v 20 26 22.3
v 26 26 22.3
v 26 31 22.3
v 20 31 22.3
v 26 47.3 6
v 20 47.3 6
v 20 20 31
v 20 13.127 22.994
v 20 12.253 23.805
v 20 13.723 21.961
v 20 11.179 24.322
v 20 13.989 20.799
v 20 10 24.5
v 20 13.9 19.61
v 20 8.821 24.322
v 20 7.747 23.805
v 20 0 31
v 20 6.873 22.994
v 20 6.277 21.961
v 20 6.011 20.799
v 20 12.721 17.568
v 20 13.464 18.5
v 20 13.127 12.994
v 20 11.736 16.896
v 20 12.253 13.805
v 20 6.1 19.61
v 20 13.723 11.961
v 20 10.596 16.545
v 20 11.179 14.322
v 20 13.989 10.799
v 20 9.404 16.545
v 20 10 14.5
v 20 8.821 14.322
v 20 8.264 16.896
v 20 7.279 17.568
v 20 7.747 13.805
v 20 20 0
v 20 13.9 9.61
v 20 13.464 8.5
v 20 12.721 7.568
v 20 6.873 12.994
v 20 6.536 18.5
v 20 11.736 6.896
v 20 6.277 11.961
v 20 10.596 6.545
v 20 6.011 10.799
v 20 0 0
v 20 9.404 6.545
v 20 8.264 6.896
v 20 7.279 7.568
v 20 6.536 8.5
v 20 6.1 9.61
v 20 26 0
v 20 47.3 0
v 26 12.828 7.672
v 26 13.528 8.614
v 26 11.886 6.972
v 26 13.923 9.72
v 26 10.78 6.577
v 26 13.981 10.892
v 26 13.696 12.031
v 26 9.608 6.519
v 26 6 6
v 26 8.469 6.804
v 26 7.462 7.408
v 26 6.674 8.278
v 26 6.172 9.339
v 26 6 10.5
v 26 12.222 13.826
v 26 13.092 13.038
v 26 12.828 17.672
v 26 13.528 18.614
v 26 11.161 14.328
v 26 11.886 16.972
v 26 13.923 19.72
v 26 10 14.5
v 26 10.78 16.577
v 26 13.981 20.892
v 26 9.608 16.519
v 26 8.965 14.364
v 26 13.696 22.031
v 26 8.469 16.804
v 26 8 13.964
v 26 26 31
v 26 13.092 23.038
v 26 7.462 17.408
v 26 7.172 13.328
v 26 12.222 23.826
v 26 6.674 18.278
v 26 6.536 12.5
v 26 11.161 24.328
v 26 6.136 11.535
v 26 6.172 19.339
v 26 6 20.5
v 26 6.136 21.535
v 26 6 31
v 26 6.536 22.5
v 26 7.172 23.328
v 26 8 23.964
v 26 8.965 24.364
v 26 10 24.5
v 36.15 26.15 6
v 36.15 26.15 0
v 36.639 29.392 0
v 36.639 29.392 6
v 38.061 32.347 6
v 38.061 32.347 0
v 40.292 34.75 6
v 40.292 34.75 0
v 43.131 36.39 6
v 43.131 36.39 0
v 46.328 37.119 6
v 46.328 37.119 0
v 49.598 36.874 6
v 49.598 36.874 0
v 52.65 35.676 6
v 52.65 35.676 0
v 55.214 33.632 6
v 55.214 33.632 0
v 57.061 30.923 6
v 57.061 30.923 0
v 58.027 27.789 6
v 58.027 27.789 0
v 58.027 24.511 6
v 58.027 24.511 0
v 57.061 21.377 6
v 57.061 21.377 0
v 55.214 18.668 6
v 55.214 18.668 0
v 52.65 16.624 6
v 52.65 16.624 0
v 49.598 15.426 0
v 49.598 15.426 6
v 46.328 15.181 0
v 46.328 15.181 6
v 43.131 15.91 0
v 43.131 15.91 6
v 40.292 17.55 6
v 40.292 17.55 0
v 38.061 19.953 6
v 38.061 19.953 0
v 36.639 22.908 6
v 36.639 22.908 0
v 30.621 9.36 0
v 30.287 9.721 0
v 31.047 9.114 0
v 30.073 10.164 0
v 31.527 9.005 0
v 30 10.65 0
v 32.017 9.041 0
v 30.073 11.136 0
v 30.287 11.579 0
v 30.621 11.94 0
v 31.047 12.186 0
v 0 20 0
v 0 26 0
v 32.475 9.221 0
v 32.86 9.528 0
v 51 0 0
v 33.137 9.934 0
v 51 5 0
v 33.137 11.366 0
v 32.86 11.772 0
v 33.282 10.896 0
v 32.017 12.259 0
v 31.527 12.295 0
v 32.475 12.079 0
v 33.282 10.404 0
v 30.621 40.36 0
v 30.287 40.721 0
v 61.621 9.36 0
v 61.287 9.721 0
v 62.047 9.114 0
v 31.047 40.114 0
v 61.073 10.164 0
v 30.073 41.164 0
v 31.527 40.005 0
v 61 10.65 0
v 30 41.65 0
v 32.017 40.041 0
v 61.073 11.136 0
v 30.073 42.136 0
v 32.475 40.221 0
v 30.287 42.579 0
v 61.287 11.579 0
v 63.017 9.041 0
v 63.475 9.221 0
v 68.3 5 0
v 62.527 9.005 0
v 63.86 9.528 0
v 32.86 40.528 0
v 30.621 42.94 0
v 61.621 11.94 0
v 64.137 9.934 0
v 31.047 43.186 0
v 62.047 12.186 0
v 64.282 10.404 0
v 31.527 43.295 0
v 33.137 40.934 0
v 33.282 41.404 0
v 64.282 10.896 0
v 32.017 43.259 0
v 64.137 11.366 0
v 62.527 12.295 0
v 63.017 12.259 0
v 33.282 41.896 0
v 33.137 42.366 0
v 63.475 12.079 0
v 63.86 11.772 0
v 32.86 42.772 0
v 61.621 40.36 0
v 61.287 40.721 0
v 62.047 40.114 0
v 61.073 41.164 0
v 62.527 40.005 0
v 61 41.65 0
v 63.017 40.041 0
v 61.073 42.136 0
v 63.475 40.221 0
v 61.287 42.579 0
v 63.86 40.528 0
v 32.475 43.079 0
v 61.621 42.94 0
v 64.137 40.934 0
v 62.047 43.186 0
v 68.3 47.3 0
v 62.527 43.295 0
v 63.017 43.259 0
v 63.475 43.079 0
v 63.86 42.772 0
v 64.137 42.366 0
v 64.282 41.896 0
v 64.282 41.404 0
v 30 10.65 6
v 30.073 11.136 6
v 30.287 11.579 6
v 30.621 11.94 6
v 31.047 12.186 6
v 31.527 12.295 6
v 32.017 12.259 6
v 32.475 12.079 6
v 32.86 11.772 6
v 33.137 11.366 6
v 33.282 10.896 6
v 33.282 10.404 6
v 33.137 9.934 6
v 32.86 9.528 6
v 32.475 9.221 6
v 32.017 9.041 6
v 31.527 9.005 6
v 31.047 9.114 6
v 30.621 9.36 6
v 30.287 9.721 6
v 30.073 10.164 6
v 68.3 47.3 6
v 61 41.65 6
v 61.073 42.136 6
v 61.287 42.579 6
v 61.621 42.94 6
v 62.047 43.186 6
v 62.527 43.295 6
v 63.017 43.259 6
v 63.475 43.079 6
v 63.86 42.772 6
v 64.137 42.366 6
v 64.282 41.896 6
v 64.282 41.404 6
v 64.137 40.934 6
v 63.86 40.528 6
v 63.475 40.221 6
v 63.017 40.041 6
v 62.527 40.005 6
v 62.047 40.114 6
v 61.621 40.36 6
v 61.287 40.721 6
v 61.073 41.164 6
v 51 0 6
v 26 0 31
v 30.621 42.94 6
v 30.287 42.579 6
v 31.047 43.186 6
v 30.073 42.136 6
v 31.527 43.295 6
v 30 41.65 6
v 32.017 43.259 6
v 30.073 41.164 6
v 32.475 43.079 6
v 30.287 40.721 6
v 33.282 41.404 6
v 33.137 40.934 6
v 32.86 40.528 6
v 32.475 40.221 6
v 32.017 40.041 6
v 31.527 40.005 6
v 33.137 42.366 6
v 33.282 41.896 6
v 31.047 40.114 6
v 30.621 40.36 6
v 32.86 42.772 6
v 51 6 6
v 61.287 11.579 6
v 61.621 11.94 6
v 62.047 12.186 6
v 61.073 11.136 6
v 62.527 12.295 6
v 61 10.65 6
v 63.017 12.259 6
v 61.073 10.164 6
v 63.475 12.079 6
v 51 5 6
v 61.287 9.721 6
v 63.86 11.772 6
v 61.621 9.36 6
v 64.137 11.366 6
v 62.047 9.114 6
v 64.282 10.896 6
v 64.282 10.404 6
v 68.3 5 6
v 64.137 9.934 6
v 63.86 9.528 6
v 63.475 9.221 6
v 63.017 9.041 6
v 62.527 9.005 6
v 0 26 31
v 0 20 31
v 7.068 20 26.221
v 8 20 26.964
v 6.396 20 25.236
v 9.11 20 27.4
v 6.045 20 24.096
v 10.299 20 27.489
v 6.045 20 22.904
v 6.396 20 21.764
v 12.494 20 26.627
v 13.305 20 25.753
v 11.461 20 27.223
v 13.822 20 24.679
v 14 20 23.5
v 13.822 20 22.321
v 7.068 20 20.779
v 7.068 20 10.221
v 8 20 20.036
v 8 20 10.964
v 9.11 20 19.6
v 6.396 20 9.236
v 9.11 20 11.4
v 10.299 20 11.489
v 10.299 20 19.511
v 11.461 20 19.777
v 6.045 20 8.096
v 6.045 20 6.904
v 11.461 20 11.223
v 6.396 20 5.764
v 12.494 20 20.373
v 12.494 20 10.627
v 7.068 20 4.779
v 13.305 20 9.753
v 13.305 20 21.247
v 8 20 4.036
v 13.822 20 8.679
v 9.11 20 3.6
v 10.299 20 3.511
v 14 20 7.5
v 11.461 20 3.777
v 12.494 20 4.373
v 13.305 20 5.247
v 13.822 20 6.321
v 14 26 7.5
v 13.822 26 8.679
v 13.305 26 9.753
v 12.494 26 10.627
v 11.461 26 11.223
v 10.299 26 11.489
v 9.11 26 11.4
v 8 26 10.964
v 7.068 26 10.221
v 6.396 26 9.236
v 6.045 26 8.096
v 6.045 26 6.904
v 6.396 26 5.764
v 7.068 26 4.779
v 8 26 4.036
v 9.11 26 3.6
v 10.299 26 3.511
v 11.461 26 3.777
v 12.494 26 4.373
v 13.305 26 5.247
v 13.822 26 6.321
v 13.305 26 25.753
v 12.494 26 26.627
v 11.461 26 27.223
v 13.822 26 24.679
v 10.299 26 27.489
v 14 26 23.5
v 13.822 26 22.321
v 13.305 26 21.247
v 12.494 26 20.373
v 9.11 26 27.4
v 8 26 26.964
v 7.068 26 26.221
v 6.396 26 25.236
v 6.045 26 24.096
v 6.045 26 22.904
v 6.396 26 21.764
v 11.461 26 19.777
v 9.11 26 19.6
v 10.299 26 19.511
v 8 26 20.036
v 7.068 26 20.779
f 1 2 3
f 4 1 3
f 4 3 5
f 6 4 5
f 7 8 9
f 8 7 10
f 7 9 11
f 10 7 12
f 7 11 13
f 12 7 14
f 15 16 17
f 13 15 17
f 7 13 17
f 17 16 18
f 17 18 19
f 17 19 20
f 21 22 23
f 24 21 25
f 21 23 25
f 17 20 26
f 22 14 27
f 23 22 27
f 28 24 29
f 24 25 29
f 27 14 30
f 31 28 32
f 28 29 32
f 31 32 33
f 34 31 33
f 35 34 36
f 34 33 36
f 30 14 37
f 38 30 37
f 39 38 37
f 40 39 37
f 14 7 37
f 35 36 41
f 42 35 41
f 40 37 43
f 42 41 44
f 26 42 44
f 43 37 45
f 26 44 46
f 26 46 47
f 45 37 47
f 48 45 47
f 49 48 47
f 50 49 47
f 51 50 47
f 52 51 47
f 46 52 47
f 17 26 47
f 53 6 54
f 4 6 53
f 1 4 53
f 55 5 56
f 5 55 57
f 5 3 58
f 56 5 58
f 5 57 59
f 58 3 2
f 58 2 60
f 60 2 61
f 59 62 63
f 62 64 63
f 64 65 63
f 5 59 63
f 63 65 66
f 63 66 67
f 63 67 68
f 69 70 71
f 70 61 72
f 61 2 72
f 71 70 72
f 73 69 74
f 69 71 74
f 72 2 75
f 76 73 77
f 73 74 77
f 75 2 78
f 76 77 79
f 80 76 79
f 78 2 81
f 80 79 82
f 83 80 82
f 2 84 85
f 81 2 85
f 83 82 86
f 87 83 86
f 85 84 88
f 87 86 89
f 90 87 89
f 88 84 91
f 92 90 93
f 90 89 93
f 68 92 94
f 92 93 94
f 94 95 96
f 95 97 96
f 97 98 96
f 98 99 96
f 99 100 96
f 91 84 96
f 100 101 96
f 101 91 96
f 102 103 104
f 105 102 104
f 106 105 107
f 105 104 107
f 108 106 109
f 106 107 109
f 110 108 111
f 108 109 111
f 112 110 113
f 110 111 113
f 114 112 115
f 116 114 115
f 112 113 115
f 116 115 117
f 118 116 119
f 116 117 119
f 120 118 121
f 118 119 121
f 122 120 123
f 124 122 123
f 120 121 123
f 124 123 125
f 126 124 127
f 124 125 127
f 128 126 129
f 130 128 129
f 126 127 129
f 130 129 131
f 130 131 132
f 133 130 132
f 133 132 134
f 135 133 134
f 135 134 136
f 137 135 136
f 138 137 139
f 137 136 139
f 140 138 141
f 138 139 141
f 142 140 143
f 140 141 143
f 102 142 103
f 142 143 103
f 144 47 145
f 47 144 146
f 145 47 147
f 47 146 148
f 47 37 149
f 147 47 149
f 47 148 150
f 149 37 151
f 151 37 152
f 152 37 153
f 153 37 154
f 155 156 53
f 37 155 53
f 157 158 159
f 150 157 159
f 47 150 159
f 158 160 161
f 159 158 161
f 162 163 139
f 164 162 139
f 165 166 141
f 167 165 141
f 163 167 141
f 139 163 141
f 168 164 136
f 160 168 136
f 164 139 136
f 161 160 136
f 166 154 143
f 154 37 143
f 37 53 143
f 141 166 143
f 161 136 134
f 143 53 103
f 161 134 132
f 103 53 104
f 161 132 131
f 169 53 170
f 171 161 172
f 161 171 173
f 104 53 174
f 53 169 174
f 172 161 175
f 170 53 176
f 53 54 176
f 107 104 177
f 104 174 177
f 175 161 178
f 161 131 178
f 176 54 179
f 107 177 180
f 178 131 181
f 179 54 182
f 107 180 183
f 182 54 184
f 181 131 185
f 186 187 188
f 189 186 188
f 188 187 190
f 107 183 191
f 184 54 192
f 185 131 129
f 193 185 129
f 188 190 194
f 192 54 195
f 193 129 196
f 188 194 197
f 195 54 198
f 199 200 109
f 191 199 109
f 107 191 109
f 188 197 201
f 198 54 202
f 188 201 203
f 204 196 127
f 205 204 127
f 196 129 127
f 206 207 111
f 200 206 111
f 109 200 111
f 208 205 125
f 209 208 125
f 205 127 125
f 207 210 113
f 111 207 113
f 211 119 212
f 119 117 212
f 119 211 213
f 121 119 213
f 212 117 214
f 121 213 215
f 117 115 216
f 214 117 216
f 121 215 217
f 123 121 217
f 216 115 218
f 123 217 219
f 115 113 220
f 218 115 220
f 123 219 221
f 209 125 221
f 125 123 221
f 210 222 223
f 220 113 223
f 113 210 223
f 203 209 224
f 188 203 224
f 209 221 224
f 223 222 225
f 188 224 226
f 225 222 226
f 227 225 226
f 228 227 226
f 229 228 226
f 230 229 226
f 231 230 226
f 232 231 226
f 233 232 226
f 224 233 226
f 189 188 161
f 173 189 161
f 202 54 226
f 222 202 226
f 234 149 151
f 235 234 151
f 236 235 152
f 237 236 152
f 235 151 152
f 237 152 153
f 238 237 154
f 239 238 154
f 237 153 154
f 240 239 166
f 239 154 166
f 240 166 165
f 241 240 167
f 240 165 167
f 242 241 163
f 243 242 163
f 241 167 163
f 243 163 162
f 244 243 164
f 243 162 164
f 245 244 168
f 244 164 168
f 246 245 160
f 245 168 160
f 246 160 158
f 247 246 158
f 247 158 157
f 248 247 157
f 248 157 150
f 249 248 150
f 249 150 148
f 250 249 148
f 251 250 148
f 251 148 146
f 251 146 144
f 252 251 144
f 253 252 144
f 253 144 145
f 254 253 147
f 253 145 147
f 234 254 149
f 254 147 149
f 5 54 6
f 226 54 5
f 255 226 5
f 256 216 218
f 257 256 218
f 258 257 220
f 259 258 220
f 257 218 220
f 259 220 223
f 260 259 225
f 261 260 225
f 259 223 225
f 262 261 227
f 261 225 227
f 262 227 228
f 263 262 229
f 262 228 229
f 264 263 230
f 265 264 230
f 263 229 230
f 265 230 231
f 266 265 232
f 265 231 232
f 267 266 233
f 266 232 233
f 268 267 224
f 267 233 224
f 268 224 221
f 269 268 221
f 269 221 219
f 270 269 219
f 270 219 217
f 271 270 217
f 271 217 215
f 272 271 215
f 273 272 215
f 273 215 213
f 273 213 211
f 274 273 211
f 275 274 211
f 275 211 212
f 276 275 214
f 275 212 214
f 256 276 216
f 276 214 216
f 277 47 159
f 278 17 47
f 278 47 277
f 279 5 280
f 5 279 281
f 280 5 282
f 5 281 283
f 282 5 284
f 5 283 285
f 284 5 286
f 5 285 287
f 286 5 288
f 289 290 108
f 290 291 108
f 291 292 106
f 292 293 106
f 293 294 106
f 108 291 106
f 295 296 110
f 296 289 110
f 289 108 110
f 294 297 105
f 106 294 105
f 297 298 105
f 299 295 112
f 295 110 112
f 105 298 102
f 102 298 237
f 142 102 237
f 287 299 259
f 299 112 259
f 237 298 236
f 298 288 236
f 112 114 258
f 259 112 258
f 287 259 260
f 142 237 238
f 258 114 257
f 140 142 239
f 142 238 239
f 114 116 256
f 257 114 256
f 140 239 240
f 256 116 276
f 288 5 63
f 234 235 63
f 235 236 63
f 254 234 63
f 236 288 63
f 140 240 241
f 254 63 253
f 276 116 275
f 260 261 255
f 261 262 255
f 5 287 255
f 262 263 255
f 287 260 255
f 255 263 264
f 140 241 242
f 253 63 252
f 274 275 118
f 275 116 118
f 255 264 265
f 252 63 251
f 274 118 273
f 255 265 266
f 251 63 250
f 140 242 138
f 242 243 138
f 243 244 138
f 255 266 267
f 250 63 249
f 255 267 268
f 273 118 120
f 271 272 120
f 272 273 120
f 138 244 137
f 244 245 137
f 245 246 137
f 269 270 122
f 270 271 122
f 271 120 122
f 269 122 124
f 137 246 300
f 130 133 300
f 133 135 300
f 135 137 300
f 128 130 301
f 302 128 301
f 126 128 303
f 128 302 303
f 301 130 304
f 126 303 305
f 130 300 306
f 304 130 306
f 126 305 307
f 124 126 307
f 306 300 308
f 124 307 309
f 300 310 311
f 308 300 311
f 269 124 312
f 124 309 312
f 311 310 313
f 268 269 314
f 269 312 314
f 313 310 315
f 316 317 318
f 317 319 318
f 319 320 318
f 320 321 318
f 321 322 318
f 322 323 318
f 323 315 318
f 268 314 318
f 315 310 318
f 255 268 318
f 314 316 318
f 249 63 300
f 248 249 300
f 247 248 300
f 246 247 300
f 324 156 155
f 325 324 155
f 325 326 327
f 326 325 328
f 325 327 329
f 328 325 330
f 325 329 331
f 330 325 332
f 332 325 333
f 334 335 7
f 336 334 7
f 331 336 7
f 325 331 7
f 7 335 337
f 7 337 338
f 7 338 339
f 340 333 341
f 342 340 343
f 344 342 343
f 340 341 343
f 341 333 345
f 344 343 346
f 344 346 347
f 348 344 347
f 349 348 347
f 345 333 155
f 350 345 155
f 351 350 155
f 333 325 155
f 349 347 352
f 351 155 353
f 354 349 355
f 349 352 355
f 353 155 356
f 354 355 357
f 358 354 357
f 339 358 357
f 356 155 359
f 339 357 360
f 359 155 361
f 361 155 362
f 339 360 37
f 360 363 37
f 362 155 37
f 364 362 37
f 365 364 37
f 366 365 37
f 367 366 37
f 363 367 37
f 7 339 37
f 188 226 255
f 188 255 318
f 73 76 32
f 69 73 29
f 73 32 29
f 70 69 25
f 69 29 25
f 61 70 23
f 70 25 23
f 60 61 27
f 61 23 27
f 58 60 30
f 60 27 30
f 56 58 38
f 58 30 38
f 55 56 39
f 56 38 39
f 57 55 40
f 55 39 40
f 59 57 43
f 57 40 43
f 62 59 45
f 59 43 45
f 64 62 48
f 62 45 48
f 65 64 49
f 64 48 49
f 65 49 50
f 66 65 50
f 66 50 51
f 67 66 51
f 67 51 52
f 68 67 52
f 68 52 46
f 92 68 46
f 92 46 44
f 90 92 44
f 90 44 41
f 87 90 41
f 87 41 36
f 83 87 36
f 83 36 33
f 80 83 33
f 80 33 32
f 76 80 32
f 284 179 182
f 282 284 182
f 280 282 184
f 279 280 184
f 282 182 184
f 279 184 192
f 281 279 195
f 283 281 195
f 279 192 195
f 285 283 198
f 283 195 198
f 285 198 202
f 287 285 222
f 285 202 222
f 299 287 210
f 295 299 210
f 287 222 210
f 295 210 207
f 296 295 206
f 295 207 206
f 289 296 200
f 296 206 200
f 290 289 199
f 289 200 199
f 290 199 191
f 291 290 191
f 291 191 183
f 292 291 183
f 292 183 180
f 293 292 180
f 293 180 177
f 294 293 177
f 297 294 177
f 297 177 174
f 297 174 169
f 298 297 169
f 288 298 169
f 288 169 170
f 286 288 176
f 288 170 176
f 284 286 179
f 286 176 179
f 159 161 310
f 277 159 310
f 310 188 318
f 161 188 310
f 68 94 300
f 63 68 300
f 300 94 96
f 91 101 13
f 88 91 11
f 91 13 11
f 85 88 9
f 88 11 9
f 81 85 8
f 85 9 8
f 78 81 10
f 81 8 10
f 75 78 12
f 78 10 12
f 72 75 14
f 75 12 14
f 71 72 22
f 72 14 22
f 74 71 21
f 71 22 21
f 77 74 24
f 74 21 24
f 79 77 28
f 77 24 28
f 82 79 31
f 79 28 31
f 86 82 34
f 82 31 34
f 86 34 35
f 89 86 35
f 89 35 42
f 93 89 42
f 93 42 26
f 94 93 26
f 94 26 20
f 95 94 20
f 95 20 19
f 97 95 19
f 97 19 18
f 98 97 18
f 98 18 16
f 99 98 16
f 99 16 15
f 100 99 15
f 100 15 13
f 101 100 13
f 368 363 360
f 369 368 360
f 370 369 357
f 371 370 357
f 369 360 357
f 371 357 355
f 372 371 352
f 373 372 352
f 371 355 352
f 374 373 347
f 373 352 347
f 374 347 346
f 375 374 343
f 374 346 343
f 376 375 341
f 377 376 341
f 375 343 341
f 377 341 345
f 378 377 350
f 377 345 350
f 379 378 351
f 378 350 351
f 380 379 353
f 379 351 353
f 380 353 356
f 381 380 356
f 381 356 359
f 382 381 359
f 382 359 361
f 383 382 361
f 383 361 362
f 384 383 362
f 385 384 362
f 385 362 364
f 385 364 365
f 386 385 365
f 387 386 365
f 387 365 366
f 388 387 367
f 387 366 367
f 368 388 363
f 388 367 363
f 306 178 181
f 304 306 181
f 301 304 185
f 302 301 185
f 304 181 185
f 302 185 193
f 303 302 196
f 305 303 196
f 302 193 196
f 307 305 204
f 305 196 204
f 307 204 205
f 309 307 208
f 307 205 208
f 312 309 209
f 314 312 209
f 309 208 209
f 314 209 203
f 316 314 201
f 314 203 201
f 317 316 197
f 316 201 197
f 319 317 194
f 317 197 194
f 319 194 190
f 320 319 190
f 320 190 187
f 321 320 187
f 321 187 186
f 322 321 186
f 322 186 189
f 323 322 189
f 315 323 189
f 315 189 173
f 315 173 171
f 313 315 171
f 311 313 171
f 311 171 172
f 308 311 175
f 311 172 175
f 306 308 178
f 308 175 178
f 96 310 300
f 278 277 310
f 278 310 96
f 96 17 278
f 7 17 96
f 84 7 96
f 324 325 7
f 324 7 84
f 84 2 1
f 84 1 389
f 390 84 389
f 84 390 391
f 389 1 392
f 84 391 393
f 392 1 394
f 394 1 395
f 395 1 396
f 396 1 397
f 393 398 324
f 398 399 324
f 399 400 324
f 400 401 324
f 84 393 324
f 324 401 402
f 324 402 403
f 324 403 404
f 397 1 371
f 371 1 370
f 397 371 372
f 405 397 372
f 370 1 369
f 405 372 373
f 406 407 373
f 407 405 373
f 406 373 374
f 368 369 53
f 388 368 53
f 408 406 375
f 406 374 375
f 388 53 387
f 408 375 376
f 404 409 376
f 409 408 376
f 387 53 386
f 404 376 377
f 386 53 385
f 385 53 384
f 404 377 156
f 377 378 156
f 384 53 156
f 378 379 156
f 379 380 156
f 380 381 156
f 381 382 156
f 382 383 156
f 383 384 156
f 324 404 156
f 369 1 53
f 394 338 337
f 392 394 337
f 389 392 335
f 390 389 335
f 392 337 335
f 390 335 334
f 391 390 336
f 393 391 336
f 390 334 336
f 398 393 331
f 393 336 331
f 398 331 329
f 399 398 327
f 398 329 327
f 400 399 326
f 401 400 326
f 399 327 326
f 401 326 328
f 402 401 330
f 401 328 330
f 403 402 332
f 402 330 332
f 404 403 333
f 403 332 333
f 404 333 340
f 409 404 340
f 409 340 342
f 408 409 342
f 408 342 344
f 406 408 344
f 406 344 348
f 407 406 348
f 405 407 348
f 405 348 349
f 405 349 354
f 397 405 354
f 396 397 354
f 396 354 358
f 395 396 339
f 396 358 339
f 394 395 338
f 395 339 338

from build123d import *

# Parameters (mm, degrees)
BOSS_EXTRUDE3_DEPTH = 31
SKETCH3_R           = 1.65
SKETCH3_R_2         = 11
BOSS_EXTRUDE4_DEPTH = 6
SKETCH4_R           = 4
CUT_EXTRUDE1_DEPTH  = 6
SKETCH7_R           = 4
CUT_EXTRUDE2_DEPTH  = 75.371903297
SKETCH10_W          = 21.3
SKETCH10_H          = 6
BOSS_EXTRUDE6_DEPTH = 6
SKETCH11_W          = 25
SKETCH11_H          = 6
BOSS_EXTRUDE7_DEPTH = 5
BOSS_EXTRUDE8_DEPTH = 1


with BuildPart() as part:
    # Sketch2 → Boss-Extrude3 (new body)
    with BuildSketch(Plane(origin=(0, 0, 0), x_dir=(0, 1, 0), z_dir=(0, 0, 1))):
        Polygon((26, 0), (20, 0), (20, -20), (0, -20), (0, -26), (26, -26), align=None)
    extrude(amount=BOSS_EXTRUDE3_DEPTH)

    # Sketch3 → Boss-Extrude4 (add)
    with BuildSketch(Plane(origin=(0, 0, 0), x_dir=(1, 0, 0), z_dir=(0, 0, -1))):
        Polygon((68.3, -5), (26, -5), (26, -26), (26, -47.3), (68.3, -47.3), align=None)
        with Locations(Location((31.65, -41.65, 0), (0, 0, 180))):
            Circle(SKETCH3_R, mode=Mode.SUBTRACT)
        with Locations(Location((62.65, -41.65, 0), (0, 0, 180))):
            Circle(SKETCH3_R, mode=Mode.SUBTRACT)
        with Locations(Location((31.65, -10.65, 0), (0, 0, 180))):
            Circle(SKETCH3_R, mode=Mode.SUBTRACT)
        with Locations(Location((47.15, -26.15, 0), (0, 0, 180))):
            Circle(SKETCH3_R_2, mode=Mode.SUBTRACT)
        with Locations(Location((62.65, -10.65, 0), (0, 0, 180))):
            Circle(SKETCH3_R, mode=Mode.SUBTRACT)
    extrude(amount=-BOSS_EXTRUDE4_DEPTH)

    # Sketch4 → Cut-Extrude1 (cut)
    with BuildSketch(Plane.XZ.offset(-20)):
        with Locations((10, 7.5)):
            Circle(SKETCH4_R)
        with Locations((10, 23.5)):
            Circle(SKETCH4_R)
    extrude(amount=-CUT_EXTRUDE1_DEPTH, mode=Mode.SUBTRACT)

    # Sketch7 → Cut-Extrude2 (cut, through all)
    with BuildSketch(Plane(origin=(20, 0, 0), x_dir=(0, -1, 0), z_dir=(-1, 0, 0))):
        with Locations(Location((-10, 20.5, 0), (0, 0, 90))):
            Circle(SKETCH7_R)
        with Locations(Location((-10, 10.5, 0), (0, 0, 90))):
            Circle(SKETCH7_R)
    extrude(amount=-CUT_EXTRUDE2_DEPTH, mode=Mode.SUBTRACT)

    # Sketch10 → Boss-Extrude6 (add)
    with BuildSketch(Plane(origin=(26, 0, 0), x_dir=(0, -1, 0), z_dir=(-1, 0, 0))):
        with Locations((-36.65, 3)):
            Rectangle(SKETCH10_W, SKETCH10_H)
        Polygon((-47.3, 6), (-26, 6), (-26, 22.3), (-31, 22.3), align=None)
    extrude(amount=BOSS_EXTRUDE6_DEPTH)

    # Sketch11 → Boss-Extrude7 (add)
    with BuildSketch(Plane.XZ.offset(-5)):
        Polygon((26, 31), (26, 6), (51, 6), align=None)
        with Locations((38.5, 3)):
            Rectangle(SKETCH11_W, SKETCH11_H)
    extrude(amount=BOSS_EXTRUDE7_DEPTH)

    # Sketch13 → Boss-Extrude8 (add)
    with BuildSketch(Plane(origin=(0, 5, 0), x_dir=(-1, 0, 0), z_dir=(0, 1, 0))):
        Polygon((-51, 6), (-26, 31), (-26, 6), align=None)
    extrude(amount=BOSS_EXTRUDE8_DEPTH)


solid = part.part
